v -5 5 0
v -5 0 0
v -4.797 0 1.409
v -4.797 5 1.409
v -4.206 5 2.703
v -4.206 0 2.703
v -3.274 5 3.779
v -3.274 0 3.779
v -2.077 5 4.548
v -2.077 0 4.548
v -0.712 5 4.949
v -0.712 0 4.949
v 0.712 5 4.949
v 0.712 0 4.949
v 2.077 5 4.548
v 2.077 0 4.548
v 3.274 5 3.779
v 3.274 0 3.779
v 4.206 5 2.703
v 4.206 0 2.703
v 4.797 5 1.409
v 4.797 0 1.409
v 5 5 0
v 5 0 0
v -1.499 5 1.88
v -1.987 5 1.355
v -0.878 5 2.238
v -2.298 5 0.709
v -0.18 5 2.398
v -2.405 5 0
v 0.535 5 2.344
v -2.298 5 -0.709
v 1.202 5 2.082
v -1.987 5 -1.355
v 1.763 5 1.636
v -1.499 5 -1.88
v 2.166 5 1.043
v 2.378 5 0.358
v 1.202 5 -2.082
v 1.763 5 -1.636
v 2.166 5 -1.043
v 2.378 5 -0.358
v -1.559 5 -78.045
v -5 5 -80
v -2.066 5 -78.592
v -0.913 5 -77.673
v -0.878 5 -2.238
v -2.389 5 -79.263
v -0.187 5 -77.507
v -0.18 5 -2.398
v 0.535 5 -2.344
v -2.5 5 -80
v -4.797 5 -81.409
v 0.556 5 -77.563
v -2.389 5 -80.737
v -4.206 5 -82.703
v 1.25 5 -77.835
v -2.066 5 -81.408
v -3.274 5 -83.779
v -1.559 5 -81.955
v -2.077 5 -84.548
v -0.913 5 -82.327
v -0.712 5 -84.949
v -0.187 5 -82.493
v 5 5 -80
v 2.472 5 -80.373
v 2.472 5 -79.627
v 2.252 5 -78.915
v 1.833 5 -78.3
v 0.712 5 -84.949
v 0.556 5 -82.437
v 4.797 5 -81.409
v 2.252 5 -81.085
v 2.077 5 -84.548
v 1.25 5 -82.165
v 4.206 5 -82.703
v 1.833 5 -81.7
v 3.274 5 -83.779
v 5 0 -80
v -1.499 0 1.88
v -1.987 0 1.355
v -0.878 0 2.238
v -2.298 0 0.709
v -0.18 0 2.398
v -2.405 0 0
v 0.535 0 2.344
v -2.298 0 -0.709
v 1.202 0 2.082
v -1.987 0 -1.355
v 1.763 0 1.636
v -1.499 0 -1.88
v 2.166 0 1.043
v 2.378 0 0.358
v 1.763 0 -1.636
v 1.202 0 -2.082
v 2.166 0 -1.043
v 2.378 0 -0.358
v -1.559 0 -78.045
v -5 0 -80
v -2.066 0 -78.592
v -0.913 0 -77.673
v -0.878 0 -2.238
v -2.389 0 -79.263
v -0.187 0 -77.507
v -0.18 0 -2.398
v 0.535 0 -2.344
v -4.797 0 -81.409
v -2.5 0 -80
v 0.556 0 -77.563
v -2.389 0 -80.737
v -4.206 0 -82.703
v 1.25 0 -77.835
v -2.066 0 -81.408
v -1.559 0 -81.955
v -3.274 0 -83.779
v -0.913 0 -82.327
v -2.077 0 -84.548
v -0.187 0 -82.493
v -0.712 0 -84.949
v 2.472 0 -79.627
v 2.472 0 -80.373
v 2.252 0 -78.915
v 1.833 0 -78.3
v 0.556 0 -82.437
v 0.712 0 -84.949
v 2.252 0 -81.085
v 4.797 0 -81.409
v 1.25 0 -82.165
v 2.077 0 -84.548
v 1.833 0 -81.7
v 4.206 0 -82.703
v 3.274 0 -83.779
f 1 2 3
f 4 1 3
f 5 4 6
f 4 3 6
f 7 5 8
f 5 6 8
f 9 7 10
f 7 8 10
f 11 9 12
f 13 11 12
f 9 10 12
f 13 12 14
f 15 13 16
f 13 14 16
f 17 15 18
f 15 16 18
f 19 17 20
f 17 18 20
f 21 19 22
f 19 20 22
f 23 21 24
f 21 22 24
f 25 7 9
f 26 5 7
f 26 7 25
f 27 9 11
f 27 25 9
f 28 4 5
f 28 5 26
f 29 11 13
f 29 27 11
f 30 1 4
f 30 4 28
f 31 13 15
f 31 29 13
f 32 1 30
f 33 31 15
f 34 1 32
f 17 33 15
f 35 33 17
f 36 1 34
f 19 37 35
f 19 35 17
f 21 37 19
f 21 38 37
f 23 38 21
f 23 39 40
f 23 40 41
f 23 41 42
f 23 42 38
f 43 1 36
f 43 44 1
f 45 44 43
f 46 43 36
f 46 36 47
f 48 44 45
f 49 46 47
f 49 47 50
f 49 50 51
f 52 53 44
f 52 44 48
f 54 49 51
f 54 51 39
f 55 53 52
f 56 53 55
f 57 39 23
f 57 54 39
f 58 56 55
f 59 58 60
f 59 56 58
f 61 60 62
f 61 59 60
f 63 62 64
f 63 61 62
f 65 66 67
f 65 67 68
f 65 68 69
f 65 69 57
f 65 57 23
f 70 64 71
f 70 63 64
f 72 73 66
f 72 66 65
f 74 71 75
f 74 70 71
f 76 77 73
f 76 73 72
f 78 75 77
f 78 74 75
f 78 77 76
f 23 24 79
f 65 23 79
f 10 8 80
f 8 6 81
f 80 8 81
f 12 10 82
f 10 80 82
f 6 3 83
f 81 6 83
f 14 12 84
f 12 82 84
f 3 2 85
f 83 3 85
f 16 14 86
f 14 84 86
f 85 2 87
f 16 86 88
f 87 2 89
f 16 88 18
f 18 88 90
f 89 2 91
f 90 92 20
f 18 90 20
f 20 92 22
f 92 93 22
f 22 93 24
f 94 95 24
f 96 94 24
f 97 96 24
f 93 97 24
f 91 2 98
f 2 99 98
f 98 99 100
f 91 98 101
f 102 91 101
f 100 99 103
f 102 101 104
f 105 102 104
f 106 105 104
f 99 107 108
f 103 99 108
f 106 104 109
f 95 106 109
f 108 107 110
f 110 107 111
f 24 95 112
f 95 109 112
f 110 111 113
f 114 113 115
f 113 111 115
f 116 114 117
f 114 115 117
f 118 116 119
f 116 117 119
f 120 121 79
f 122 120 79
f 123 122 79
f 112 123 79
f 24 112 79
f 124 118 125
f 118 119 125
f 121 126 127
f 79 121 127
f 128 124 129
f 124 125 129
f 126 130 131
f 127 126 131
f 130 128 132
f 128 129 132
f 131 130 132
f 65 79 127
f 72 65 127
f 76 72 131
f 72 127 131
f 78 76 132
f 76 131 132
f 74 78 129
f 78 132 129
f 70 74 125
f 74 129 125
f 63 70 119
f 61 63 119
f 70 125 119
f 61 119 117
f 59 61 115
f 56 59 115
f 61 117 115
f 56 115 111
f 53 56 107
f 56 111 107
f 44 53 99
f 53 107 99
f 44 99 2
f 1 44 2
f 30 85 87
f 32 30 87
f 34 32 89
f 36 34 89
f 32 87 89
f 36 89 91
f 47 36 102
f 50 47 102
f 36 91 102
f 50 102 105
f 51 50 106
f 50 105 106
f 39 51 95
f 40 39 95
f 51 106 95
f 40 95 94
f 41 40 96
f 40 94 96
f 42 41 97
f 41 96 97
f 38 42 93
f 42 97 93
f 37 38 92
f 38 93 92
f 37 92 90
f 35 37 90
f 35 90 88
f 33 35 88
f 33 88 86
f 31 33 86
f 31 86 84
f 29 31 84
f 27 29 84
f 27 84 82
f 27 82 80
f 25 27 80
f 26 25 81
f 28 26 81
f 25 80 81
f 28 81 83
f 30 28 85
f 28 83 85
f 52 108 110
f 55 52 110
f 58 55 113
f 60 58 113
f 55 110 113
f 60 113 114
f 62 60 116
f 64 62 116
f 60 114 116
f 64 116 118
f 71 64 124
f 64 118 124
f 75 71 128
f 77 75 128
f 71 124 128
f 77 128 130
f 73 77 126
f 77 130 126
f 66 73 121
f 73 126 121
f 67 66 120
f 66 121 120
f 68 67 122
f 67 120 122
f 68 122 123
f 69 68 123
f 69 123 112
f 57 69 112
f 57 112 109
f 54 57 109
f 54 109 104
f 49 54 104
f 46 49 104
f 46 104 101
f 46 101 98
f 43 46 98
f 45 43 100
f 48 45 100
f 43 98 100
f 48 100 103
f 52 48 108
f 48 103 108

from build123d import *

# Parameters (mm, degrees)
SKETCH1_R           = 2.404574114
SKETCH1_R_2         = 2.5
BOSS_EXTRUDE3_DEPTH = 5


with BuildPart() as part:
    # Sketch1 → Boss-Extrude3 (new body)
    with BuildSketch(Plane(origin=(0, 0, 0), x_dir=(1, 0, 0), z_dir=(0, 1, 0))):
        with BuildLine():
            ThreePointArc((-5, 0), (0, -5), (5, 0))
            Line((5, 0), (5, 80))
            ThreePointArc((5, 80), (0, 85), (-5, 80))
            Line((-5, 80), (-5, 0))
        make_face()
        Circle(SKETCH1_R, mode=Mode.SUBTRACT)
        with Locations((0, 80)):
            Circle(SKETCH1_R_2, mode=Mode.SUBTRACT)
    extrude(amount=BOSS_EXTRUDE3_DEPTH)


solid = part.part
